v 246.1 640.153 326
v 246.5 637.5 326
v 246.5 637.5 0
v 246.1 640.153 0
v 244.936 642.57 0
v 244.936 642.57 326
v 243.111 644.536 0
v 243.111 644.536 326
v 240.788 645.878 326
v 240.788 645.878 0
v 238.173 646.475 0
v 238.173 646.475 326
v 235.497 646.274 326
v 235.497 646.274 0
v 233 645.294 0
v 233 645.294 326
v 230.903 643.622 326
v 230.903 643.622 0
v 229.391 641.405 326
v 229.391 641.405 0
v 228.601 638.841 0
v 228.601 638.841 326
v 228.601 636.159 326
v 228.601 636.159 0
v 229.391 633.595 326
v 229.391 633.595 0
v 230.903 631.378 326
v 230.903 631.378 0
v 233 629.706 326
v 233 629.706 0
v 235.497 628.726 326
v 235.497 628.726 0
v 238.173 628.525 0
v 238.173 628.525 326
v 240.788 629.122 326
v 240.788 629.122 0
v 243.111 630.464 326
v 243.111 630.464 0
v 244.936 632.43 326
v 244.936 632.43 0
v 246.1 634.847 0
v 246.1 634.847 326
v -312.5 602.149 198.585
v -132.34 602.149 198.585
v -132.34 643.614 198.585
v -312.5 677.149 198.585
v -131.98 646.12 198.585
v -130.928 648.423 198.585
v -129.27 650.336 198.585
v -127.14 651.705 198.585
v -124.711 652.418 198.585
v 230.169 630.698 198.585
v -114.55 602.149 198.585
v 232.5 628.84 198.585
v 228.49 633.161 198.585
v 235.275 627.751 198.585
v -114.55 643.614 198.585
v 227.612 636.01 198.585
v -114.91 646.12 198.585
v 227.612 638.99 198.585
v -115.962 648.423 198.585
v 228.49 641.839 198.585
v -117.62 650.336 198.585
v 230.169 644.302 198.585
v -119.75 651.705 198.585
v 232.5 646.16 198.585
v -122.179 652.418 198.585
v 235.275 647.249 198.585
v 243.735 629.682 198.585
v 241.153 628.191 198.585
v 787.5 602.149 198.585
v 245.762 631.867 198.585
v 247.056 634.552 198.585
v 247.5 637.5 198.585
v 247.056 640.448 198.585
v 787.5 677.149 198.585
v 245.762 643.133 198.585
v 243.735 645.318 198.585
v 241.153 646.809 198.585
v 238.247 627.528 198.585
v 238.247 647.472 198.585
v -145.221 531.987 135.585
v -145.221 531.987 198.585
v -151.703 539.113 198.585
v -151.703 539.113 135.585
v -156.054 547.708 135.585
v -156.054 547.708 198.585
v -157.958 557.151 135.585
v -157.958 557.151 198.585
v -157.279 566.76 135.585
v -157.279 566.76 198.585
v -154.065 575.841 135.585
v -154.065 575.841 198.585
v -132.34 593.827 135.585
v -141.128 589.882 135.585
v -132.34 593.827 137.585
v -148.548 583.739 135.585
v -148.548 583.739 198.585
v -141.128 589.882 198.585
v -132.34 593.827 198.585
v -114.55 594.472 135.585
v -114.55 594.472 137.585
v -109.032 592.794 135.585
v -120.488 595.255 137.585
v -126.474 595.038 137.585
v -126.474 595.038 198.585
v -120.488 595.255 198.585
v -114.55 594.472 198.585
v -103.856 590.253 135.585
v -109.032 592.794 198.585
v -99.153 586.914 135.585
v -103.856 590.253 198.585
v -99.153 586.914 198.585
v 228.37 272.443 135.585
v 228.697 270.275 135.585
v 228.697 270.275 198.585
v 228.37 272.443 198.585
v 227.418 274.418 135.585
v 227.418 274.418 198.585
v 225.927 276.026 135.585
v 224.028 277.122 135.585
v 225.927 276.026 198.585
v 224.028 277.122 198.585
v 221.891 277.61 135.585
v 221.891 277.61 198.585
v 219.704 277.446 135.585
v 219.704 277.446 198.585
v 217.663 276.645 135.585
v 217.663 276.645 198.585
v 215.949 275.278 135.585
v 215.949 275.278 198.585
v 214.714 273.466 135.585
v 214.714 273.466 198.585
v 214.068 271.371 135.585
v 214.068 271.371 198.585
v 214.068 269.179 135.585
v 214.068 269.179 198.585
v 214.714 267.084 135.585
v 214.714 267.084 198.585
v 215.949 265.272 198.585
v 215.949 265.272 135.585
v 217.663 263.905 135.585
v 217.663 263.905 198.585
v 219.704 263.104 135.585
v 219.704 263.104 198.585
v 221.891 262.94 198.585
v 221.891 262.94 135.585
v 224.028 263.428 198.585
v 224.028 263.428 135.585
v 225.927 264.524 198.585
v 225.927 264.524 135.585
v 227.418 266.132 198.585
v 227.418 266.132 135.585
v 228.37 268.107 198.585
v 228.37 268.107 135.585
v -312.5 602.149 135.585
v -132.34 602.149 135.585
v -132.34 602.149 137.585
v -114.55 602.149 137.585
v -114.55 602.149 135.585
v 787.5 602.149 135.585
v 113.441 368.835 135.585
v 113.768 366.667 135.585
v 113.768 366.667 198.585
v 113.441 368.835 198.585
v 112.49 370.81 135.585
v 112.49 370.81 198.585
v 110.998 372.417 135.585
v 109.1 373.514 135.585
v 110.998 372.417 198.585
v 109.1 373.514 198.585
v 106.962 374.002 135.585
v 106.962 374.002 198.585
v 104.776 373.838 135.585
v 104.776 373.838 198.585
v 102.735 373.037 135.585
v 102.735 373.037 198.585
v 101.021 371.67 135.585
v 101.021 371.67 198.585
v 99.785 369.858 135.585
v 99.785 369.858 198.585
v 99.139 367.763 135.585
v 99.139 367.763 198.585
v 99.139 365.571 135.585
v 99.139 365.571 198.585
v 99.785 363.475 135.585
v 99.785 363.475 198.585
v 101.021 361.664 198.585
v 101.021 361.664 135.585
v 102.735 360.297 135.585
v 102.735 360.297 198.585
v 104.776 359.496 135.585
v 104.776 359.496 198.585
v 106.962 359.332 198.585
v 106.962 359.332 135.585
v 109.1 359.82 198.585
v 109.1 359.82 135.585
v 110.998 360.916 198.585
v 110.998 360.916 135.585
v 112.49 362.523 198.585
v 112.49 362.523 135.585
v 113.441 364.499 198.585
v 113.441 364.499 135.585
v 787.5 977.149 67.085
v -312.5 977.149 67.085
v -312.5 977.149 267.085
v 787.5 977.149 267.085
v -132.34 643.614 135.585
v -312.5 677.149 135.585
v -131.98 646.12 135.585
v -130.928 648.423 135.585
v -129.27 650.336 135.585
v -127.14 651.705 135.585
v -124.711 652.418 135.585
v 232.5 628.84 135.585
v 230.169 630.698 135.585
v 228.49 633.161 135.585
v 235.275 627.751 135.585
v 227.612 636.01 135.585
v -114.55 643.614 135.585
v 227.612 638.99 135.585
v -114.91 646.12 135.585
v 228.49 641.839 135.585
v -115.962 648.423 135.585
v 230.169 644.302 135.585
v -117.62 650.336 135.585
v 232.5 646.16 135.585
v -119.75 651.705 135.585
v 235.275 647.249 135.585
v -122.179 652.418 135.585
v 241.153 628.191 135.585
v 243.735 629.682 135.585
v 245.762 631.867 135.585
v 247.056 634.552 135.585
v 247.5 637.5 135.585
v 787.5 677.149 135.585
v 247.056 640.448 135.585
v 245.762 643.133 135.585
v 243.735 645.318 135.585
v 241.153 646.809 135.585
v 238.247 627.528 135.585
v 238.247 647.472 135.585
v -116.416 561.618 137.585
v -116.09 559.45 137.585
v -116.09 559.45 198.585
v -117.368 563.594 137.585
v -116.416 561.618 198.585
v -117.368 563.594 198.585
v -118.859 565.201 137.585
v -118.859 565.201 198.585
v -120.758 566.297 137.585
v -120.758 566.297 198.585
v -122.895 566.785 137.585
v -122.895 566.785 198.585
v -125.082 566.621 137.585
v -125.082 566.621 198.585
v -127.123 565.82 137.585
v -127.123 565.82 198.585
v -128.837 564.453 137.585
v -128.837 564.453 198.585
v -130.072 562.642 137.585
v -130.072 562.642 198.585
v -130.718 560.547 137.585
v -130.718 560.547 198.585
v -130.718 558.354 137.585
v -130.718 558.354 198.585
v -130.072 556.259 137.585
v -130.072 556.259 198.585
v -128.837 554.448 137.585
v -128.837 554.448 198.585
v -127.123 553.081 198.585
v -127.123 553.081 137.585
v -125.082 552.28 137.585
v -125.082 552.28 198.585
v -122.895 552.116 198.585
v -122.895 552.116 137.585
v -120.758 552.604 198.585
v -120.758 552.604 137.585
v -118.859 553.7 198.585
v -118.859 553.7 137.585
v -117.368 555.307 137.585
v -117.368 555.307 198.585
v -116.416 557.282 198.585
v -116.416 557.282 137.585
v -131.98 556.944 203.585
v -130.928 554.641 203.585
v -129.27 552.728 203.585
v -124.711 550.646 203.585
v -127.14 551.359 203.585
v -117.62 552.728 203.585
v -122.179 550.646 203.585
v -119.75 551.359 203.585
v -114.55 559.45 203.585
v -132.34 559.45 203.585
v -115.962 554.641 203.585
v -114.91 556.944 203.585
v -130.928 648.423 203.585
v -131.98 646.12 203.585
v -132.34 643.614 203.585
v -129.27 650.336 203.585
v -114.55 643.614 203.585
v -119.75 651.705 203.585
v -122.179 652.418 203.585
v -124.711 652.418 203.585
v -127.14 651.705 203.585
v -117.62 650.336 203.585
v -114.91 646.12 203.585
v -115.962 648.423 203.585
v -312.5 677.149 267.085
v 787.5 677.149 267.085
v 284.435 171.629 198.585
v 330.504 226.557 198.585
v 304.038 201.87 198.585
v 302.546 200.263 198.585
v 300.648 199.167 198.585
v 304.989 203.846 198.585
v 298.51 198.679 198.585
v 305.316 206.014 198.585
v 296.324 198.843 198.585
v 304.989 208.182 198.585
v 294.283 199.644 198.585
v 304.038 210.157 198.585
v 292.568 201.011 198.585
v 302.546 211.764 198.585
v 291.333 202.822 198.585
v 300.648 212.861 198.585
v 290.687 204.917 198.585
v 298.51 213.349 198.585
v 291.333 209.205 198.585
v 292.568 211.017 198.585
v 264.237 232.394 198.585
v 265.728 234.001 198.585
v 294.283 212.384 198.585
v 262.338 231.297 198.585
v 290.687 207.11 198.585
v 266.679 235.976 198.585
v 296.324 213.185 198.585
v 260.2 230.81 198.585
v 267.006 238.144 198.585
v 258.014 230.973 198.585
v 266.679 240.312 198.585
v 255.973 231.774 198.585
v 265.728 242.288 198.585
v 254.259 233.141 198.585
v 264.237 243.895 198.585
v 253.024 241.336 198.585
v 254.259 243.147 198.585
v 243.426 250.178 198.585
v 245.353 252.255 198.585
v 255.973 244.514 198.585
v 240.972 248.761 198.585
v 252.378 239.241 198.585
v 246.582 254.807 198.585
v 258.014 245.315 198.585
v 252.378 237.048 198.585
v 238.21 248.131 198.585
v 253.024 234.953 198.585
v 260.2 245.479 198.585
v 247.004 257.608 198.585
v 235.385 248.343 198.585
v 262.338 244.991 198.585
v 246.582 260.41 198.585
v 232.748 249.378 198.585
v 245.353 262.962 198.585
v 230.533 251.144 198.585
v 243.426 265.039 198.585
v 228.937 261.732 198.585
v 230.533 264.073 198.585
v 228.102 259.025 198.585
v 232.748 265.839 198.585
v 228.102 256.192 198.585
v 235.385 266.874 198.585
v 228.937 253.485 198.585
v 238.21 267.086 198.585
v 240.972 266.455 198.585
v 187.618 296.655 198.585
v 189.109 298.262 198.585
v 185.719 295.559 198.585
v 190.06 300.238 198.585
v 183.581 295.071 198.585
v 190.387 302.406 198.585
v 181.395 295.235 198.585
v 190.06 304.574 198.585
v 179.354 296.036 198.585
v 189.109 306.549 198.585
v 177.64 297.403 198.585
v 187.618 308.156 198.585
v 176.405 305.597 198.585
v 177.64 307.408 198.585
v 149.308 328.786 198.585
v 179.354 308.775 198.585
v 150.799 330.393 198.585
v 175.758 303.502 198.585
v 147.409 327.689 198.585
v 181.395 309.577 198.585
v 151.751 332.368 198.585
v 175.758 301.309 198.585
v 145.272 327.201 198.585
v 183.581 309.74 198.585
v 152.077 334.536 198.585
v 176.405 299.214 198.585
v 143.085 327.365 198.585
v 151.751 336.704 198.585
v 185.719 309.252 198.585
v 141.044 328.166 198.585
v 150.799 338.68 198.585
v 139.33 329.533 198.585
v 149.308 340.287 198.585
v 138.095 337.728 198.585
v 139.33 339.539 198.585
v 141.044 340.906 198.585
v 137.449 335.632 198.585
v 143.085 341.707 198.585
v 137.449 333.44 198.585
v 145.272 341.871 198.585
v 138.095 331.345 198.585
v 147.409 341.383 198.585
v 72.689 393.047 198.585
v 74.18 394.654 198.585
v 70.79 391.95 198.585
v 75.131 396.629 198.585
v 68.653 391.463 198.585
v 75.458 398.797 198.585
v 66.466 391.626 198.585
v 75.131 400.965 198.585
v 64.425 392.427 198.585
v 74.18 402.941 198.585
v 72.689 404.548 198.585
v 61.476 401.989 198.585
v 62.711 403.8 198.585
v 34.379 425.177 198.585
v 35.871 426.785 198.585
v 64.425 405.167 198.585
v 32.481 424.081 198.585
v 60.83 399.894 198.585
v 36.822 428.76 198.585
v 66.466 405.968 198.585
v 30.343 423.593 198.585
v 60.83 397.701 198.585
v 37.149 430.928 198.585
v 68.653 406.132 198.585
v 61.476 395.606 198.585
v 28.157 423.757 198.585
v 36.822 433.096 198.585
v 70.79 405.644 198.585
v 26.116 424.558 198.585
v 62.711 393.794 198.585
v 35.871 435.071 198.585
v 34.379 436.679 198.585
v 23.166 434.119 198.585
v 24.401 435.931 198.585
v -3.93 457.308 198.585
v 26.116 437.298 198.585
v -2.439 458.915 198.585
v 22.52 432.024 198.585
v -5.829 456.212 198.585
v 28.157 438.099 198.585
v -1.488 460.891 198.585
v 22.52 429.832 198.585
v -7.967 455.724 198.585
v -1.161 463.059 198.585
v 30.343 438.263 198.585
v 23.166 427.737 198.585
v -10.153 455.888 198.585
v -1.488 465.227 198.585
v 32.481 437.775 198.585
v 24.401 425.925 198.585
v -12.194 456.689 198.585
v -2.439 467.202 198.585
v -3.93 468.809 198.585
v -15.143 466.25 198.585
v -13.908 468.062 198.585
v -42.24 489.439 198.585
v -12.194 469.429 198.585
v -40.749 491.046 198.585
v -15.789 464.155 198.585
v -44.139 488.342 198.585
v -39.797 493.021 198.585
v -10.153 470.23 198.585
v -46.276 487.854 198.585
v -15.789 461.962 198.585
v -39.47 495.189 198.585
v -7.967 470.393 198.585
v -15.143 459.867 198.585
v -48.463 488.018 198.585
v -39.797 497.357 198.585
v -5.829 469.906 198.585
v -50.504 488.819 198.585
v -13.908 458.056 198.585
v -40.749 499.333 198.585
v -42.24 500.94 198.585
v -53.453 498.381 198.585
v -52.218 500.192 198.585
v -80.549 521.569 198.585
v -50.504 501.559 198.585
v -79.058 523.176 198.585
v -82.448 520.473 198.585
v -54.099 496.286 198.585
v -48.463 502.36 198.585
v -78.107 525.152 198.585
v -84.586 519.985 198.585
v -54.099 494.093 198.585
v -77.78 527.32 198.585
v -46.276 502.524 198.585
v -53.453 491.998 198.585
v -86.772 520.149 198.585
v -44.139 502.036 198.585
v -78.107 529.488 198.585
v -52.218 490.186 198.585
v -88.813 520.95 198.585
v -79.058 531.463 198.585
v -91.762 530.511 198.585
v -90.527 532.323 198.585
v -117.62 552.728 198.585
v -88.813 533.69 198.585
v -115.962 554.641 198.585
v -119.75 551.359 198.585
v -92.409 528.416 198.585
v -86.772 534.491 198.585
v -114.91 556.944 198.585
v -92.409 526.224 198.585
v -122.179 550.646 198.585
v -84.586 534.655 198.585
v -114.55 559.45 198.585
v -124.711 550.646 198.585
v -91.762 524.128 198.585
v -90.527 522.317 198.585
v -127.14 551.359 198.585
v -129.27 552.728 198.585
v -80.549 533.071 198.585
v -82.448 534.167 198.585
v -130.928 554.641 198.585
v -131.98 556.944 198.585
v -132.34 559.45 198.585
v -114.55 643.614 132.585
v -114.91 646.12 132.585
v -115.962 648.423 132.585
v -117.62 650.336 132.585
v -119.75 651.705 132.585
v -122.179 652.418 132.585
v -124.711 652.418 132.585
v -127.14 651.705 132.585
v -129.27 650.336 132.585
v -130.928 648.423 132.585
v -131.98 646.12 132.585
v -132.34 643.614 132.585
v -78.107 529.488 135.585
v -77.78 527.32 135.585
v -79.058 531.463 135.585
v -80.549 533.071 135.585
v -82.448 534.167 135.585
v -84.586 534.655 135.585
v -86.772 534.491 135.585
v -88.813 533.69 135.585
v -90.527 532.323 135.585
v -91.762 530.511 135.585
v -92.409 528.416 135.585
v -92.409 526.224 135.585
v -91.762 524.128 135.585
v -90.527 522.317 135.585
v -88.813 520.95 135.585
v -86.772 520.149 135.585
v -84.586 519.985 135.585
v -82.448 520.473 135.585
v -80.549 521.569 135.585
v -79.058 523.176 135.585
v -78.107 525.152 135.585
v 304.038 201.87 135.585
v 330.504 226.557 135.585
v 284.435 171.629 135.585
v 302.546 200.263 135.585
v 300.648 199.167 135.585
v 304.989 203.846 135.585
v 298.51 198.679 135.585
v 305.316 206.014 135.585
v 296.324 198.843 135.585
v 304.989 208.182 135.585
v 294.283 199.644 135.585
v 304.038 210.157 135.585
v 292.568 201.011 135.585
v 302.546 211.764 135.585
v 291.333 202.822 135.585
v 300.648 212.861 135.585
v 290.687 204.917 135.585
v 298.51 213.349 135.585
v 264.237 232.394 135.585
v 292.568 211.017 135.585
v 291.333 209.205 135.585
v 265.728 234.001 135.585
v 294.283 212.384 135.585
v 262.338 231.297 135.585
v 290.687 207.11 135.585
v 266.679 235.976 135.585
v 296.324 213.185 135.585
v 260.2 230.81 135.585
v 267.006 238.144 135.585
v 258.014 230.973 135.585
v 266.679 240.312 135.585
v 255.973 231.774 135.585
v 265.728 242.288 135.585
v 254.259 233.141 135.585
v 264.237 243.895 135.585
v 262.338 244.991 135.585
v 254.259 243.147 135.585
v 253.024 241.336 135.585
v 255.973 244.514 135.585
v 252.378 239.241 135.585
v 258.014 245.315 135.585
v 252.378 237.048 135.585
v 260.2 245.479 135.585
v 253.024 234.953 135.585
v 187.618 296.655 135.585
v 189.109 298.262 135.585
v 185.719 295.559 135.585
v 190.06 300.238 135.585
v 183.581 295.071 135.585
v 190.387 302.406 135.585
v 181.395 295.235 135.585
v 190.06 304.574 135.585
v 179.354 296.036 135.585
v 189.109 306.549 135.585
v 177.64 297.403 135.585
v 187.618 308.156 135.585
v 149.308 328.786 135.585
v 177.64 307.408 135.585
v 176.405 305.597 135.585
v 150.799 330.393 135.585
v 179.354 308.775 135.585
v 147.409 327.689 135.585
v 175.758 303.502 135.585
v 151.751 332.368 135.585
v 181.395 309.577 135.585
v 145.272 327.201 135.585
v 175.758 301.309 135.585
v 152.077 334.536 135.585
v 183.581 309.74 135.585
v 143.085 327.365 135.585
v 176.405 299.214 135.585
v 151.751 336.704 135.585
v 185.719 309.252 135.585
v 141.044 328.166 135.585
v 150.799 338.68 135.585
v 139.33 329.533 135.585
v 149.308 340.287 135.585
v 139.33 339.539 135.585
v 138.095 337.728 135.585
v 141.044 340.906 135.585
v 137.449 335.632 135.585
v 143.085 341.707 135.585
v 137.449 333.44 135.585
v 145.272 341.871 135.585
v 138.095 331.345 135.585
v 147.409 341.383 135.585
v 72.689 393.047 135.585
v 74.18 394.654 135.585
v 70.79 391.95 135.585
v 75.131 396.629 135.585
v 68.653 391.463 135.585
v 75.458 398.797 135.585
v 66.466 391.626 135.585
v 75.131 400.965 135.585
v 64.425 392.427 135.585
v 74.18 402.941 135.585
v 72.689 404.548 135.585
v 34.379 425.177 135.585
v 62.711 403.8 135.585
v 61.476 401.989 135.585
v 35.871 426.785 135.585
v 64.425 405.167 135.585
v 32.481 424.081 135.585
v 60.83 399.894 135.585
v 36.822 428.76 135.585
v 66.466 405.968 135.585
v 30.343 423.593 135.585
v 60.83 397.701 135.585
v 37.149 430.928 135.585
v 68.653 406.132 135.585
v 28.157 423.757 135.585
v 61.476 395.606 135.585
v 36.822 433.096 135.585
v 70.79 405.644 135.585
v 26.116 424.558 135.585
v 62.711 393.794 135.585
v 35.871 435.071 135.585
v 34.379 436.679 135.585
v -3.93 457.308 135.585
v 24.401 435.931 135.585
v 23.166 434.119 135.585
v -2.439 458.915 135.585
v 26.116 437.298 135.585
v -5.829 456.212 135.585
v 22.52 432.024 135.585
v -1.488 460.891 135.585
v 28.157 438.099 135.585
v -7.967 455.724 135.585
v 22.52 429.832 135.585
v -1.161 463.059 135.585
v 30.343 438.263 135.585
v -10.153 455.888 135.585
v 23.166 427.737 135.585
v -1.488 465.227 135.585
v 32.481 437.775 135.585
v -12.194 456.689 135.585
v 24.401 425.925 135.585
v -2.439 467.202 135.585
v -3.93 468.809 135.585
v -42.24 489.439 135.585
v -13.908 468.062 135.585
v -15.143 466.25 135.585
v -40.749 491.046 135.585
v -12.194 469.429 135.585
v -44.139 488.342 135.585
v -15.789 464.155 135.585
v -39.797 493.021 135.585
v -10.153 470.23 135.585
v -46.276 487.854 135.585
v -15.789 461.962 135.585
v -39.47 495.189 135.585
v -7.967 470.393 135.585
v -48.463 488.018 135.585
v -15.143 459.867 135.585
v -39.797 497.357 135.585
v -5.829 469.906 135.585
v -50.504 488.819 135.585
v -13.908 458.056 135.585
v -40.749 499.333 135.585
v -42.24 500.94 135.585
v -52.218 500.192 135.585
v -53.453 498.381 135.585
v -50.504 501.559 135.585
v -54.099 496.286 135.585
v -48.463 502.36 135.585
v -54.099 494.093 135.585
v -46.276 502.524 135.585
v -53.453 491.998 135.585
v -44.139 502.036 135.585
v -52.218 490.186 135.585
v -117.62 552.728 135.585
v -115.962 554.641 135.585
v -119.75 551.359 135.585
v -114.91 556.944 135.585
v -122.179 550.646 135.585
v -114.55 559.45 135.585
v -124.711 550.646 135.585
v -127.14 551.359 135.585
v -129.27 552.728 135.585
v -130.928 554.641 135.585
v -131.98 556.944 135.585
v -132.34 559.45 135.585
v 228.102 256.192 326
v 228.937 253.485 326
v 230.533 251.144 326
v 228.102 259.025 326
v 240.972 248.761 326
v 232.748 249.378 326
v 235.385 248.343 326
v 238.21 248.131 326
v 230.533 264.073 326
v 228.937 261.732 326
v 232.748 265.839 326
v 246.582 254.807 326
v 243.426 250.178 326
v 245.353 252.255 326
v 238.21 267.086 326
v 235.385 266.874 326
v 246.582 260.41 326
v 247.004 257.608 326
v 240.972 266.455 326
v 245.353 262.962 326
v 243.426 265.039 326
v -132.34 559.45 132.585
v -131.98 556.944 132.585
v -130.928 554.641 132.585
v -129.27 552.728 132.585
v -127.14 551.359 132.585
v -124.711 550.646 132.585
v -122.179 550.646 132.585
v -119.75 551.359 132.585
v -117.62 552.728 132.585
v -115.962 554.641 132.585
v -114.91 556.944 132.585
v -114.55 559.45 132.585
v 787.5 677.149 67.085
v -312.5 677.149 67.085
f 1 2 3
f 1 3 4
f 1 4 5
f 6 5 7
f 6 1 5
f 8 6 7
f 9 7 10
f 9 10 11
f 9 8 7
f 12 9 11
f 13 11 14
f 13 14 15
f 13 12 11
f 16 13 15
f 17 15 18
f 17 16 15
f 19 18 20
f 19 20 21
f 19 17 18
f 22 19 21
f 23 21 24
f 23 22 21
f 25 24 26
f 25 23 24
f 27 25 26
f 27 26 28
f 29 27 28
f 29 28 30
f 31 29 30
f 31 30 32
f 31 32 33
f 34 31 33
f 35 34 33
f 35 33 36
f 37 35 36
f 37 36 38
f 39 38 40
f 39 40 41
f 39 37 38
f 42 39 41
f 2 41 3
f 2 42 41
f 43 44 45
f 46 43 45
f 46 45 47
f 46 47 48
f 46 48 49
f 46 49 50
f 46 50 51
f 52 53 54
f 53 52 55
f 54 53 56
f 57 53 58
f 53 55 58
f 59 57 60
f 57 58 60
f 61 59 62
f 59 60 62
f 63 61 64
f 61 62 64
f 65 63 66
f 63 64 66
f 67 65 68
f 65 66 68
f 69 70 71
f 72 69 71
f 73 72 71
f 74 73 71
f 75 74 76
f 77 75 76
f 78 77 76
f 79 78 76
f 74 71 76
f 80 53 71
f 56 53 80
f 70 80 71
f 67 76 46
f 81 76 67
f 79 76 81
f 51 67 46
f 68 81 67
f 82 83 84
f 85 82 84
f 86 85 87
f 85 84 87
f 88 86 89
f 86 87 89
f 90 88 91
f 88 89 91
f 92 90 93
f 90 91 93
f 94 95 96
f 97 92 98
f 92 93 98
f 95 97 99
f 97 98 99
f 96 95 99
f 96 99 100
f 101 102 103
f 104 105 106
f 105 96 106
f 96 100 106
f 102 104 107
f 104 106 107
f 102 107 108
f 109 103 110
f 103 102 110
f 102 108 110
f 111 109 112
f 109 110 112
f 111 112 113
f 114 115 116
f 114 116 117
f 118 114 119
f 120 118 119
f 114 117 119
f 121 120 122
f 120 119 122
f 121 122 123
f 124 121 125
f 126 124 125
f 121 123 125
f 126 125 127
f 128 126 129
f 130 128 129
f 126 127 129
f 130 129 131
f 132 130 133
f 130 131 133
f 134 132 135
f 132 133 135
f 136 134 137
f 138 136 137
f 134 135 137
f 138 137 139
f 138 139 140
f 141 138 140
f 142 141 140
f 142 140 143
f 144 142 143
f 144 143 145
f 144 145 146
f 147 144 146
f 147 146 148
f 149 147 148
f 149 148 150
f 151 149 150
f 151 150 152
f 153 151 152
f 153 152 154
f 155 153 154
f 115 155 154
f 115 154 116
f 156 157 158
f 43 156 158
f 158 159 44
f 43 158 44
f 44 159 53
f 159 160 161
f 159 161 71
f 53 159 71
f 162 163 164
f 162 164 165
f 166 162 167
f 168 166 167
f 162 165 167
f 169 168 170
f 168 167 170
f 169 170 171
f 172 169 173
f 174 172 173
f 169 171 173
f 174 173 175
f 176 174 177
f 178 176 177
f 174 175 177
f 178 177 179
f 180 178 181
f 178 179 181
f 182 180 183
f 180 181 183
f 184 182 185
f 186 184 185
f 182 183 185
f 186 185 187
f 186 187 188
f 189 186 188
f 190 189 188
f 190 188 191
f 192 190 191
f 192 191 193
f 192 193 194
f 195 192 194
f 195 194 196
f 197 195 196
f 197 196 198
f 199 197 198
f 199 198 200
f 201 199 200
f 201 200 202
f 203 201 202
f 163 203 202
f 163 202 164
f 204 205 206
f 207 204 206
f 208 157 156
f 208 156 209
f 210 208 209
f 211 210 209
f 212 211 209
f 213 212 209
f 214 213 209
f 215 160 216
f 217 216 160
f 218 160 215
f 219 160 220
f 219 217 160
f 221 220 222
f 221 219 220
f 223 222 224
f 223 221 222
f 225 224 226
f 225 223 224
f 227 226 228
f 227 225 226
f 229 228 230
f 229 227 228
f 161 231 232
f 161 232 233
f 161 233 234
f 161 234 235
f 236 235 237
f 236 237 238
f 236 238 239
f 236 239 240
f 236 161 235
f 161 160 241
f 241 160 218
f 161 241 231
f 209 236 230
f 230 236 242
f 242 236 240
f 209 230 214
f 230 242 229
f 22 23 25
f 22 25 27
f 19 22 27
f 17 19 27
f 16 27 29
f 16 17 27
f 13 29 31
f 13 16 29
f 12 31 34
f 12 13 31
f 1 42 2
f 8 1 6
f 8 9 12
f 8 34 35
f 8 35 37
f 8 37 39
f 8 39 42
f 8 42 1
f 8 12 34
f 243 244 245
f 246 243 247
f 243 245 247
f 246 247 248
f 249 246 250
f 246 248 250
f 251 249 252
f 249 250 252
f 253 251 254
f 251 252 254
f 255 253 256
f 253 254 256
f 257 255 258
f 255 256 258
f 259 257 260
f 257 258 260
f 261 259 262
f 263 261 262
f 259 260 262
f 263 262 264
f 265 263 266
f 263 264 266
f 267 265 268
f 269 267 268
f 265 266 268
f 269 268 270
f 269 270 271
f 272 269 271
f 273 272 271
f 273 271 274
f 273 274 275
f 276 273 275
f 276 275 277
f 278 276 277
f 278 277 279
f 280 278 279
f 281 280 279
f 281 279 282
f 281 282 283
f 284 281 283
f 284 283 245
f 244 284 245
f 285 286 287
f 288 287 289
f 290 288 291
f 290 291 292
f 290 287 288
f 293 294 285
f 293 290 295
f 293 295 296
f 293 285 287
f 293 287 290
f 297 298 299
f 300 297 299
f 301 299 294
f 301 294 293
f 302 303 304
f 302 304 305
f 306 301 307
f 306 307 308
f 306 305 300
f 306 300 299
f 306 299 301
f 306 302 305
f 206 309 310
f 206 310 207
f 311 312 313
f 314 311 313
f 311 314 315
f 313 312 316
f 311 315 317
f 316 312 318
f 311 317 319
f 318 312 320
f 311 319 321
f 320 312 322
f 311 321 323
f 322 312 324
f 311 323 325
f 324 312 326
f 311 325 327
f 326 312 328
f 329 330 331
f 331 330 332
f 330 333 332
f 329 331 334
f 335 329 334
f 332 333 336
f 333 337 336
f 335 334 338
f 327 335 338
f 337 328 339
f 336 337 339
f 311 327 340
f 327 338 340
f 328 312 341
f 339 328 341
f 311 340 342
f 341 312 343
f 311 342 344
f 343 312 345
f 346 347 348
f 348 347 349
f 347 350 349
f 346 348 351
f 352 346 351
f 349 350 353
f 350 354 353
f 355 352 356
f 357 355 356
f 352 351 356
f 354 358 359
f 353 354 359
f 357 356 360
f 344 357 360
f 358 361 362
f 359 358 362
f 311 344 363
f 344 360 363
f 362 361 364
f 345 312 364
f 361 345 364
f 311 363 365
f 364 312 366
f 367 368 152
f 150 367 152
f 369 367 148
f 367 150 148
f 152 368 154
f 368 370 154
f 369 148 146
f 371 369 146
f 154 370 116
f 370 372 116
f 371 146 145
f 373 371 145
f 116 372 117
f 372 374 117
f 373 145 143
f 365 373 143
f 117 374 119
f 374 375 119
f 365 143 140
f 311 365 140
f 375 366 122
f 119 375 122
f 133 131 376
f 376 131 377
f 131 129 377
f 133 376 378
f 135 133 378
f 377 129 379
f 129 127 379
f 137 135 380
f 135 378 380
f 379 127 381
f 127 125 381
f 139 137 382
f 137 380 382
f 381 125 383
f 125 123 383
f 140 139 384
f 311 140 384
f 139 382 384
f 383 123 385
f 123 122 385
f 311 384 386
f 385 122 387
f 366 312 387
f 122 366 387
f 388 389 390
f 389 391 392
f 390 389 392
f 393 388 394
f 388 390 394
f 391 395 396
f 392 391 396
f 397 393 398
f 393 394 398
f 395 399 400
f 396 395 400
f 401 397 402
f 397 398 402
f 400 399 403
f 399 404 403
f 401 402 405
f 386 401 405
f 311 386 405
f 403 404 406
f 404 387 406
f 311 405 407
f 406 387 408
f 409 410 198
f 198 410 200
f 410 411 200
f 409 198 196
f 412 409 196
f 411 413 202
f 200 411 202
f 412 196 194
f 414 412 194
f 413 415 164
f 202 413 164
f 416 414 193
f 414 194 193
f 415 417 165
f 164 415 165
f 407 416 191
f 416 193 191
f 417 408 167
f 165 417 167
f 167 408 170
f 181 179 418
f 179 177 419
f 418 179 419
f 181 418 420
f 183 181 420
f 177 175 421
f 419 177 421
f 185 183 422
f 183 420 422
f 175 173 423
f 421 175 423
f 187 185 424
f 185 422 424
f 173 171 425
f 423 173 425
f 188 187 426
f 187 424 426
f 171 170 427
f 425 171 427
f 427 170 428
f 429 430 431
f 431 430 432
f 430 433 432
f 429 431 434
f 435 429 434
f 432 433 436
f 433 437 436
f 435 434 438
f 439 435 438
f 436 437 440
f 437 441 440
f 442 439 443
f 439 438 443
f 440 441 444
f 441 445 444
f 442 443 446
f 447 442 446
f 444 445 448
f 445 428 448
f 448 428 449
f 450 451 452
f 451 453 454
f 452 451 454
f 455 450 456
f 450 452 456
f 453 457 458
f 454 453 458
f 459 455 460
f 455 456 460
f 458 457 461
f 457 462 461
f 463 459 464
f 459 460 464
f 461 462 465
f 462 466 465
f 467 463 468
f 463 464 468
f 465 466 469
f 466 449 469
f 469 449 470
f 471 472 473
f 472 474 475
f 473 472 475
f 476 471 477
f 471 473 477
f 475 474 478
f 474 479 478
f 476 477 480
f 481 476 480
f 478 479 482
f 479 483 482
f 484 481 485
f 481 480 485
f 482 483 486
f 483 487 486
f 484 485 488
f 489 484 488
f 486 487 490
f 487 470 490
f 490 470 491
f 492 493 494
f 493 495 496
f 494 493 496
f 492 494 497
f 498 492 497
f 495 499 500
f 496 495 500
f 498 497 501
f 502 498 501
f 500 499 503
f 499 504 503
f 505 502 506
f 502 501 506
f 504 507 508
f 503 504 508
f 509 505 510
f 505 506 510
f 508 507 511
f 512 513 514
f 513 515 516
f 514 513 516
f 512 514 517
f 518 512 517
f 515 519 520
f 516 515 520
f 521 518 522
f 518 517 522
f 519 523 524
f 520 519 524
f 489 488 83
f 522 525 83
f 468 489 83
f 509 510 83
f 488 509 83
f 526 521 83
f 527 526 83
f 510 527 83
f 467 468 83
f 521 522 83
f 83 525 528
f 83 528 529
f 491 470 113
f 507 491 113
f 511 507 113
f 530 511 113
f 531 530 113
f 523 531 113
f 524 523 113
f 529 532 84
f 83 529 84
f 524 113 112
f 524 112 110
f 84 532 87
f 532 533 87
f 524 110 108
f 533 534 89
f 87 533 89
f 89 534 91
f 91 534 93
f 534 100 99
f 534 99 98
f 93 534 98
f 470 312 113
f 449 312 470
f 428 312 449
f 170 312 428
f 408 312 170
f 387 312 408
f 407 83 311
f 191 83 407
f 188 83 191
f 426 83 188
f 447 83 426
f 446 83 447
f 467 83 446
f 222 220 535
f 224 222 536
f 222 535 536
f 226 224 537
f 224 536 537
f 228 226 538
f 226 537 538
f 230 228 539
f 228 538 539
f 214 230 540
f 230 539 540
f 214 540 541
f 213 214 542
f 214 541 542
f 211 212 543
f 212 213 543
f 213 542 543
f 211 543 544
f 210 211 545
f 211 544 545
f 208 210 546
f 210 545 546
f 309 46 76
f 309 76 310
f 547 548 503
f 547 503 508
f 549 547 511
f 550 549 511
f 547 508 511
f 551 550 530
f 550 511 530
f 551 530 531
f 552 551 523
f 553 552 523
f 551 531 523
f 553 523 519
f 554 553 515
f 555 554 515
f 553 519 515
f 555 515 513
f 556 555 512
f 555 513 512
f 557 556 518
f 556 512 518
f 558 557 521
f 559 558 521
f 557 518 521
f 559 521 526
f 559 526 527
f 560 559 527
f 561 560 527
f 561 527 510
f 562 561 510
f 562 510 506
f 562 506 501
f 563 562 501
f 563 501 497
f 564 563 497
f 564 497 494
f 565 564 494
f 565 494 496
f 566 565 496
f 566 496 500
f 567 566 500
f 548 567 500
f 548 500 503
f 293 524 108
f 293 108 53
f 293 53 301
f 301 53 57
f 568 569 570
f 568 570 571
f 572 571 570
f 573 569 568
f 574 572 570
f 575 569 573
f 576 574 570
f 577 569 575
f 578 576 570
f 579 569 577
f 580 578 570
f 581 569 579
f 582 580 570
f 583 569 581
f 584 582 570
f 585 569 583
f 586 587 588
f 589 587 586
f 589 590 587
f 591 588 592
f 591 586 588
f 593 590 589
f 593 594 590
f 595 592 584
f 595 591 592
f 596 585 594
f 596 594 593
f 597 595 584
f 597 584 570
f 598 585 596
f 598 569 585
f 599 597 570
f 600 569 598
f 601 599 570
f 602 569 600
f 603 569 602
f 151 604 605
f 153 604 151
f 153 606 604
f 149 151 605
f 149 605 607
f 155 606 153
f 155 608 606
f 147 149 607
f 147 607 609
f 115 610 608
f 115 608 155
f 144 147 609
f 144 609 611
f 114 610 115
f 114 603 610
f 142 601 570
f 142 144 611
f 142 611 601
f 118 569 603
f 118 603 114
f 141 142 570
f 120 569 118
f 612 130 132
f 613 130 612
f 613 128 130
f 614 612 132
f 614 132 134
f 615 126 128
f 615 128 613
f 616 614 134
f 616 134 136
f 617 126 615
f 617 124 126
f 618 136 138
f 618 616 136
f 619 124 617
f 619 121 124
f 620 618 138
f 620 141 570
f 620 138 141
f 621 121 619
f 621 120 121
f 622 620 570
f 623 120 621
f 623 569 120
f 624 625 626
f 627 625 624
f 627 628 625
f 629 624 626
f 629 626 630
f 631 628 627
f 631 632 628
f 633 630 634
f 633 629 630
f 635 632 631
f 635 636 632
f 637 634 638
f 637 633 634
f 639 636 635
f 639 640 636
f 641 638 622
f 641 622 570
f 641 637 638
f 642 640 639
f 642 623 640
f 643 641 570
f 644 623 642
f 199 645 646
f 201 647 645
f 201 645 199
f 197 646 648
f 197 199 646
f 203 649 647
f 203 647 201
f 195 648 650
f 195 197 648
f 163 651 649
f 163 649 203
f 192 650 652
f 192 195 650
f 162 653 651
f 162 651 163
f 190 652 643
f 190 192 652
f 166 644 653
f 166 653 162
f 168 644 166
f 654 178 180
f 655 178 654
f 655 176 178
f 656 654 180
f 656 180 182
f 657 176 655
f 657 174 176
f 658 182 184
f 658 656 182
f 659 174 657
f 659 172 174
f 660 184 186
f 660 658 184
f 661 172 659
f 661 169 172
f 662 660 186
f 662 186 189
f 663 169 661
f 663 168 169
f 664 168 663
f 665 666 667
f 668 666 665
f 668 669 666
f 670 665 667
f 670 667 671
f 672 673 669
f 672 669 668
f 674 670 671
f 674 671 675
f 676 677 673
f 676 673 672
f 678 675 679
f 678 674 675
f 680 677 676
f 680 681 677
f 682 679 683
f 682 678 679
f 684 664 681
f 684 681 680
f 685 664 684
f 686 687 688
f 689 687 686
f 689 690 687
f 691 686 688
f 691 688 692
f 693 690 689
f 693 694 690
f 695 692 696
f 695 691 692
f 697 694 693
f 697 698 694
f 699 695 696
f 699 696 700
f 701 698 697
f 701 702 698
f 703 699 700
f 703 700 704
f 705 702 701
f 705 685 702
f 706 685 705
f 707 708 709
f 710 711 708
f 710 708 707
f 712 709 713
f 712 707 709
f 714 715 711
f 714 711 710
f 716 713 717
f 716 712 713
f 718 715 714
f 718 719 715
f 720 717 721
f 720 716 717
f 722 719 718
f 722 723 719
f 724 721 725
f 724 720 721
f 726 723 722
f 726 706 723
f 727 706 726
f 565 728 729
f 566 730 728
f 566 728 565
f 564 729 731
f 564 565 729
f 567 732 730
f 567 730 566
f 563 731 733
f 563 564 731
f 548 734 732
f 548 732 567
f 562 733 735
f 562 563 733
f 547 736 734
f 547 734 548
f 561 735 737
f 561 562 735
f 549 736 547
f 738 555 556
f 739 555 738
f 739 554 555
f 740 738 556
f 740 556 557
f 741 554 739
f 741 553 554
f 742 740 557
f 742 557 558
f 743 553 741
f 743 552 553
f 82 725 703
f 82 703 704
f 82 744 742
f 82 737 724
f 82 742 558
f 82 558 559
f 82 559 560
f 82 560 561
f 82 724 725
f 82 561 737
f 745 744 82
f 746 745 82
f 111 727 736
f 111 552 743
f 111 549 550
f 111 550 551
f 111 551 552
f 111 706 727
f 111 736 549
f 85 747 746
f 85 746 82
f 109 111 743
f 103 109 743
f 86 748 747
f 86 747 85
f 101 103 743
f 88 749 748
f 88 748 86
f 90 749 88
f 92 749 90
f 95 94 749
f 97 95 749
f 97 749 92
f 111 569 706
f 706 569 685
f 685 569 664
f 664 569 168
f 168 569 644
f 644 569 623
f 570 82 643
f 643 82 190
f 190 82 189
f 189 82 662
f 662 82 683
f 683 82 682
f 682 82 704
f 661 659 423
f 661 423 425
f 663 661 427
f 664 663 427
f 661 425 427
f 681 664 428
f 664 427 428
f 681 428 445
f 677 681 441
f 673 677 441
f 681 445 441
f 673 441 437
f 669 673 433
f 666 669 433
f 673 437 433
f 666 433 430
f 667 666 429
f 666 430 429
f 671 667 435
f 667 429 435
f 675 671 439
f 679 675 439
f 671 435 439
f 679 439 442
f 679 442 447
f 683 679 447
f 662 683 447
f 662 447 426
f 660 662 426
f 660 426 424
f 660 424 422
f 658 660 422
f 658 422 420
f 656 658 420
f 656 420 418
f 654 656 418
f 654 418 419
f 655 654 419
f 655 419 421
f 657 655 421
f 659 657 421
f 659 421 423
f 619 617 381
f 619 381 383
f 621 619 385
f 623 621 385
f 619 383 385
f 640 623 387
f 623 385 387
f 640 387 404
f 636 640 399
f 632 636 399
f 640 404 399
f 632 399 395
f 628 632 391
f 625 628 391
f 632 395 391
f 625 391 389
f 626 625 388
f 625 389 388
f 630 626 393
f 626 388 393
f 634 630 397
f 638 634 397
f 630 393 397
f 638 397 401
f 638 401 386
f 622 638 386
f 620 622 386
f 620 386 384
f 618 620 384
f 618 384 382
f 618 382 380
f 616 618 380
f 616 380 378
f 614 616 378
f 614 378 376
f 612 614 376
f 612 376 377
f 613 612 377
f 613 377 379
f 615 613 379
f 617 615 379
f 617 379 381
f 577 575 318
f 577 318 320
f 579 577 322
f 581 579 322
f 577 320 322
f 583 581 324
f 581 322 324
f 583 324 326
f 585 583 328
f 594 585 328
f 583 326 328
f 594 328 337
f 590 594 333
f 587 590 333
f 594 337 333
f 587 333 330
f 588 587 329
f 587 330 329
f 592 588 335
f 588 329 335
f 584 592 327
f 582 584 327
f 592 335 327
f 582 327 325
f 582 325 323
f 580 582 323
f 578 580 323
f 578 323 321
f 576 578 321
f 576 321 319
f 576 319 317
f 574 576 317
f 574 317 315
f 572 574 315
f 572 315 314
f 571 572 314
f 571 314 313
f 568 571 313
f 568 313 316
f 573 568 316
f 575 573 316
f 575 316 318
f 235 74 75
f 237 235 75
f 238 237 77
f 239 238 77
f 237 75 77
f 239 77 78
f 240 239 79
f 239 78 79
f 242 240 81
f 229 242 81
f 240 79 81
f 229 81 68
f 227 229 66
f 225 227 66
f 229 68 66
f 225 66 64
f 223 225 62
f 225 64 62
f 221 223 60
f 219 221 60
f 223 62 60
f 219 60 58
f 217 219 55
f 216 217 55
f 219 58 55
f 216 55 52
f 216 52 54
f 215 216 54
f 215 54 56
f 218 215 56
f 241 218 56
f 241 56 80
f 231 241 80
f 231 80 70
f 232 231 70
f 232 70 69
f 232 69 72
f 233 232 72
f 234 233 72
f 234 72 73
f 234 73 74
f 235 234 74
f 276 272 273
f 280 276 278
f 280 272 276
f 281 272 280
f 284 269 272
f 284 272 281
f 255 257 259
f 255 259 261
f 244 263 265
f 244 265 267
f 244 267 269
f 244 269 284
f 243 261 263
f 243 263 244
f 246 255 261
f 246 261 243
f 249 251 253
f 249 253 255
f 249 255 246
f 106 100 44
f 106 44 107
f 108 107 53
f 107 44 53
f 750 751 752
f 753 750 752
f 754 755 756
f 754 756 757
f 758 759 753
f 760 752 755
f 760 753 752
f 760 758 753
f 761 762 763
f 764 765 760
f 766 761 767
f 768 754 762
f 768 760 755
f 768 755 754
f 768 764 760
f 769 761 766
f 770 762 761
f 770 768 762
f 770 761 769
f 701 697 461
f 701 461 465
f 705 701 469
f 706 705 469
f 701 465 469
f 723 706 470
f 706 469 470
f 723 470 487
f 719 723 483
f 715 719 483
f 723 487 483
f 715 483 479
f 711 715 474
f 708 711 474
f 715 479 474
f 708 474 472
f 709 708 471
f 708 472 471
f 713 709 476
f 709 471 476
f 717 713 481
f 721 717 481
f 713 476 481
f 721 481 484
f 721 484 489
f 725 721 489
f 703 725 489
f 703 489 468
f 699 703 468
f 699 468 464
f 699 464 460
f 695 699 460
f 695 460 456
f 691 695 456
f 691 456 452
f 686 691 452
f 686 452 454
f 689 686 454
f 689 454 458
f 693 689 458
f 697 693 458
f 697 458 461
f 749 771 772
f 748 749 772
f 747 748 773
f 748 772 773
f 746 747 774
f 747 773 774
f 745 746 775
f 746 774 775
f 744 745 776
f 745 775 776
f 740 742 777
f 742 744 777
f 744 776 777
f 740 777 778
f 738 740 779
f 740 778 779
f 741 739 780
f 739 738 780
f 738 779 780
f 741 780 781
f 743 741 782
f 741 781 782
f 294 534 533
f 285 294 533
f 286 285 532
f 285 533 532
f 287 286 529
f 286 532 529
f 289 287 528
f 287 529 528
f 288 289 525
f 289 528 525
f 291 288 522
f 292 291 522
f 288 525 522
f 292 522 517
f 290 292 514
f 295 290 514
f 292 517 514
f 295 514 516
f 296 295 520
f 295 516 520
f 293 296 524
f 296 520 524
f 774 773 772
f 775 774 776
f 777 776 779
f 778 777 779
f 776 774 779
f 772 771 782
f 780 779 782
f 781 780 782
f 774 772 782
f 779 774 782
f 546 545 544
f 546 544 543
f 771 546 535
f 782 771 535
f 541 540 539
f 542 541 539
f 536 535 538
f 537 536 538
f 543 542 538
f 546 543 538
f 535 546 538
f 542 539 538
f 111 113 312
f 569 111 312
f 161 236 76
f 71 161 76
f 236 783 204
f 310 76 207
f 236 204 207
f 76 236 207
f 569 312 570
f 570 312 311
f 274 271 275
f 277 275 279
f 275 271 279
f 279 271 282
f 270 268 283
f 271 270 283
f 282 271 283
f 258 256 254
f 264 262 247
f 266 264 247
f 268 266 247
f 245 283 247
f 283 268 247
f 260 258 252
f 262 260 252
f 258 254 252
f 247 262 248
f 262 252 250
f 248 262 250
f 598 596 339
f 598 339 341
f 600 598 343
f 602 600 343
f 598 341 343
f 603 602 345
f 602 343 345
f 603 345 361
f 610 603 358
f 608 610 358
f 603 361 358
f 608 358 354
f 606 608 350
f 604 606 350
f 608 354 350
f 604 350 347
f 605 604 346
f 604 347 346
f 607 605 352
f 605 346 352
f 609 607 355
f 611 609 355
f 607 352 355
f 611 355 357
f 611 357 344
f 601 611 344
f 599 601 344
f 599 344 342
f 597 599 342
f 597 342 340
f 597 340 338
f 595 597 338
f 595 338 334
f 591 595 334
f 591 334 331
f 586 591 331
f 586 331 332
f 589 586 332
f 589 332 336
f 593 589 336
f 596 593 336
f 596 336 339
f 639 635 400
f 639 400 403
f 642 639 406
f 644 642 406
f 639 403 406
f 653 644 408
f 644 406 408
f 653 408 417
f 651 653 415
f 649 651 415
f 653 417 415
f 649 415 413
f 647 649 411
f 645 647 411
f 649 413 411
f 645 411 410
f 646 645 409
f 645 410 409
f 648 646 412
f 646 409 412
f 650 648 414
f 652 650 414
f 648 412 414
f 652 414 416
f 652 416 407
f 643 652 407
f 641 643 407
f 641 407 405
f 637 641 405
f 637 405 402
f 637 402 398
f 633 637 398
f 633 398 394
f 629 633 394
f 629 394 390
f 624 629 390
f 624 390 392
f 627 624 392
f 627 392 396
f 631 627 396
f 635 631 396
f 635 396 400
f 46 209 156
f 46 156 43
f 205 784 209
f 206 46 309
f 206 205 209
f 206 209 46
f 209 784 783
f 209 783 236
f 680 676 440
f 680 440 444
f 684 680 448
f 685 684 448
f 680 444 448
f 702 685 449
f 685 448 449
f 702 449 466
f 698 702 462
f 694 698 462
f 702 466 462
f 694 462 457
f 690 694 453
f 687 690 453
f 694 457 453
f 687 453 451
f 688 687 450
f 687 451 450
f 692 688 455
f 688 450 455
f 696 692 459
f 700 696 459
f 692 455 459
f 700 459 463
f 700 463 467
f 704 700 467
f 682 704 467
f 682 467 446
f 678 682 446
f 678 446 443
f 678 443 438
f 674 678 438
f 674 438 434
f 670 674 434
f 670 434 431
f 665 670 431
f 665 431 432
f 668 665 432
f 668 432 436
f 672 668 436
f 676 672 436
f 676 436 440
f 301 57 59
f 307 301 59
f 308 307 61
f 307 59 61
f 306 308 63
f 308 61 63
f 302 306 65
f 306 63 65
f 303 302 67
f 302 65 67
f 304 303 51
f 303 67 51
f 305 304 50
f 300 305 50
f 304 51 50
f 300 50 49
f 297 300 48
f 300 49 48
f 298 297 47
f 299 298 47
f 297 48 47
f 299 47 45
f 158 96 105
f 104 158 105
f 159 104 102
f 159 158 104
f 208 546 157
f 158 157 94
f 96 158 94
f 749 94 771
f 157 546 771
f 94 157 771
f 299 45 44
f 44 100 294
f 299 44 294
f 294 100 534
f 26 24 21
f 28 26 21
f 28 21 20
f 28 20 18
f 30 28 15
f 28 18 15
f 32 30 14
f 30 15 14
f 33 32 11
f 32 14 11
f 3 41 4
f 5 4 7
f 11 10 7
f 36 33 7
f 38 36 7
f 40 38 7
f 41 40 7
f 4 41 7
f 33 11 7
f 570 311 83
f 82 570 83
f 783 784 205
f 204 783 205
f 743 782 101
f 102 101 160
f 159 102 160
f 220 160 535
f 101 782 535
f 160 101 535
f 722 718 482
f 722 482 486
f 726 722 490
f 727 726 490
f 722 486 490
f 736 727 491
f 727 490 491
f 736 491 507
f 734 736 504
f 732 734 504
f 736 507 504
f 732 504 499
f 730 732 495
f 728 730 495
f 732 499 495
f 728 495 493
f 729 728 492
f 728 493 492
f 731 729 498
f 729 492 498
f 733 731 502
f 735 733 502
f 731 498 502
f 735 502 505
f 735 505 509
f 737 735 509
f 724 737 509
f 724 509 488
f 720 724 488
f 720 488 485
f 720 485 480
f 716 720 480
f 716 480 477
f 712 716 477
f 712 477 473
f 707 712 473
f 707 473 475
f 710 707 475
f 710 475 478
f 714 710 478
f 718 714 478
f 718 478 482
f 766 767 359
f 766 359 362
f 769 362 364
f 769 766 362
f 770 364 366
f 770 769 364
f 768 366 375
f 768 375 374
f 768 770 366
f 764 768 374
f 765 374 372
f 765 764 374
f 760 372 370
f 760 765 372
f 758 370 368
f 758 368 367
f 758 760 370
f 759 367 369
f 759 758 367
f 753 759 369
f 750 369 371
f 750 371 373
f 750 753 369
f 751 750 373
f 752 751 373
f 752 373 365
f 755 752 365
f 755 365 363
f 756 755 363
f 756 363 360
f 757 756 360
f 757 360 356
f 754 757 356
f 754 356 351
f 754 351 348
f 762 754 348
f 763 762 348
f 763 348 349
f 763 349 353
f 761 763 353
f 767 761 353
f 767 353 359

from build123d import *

# Parameters (mm, degrees)
BOSS_EXTRU_4_DEPTH         = 550
BOSS_EXTRU_4_DEPTH_BACK    = 550
ESQUISSE7_W                = 63
ESQUISSE7_H                = 75
ESQUISSE3_R                = 10
ENL_V_MAT_EXTRU_2_DEPTH    = 1056.909601573
BOSS_EXTRU_5_DEPTH         = 63
BOSS_EXTRU_6_DEPTH         = 5
ESQUISSE12_R               = 7.355365699
ENL_V_MAT_EXTRU_3_DEPTH    = 100
R_P_TITION_LIN_AIRE2_COUNT = 12
R_P_TITION_LIN_AIRE2_PITCH = 50
BOSS_EXTRU_7_REACH         = 1057.91
ESQUISSE13_R               = 9.503964929
R_P_TITION_LIN_AIRE3_COUNT = 2
R_P_TITION_LIN_AIRE3_PITCH = 66
ESQUISSE14_R               = 9
BOSS_EXTRU_8_DEPTH         = 326
ESQUISSE15_W               = 200
ESQUISSE15_H               = 300
BOSS_EXTRU_9_DEPTH         = 1100


with BuildPart() as part:
    # Esquisse7 → Boss.-Extru.4 (new, two sides: drawn at the far end of the back side and taken through both)
    with BuildSketch(Plane.ZY.offset(-237.5).offset(-BOSS_EXTRU_4_DEPTH_BACK)):
        with Locations((167.0850662, 639.649163537)):
            Rectangle(ESQUISSE7_W, ESQUISSE7_H)
    extrude(amount=BOSS_EXTRU_4_DEPTH + BOSS_EXTRU_4_DEPTH_BACK)

    # Esquisse3 → Enlèv. mat.-Extru.2 (cut, through all)
    with BuildSketch(Plane.XY.offset(326)):
        with Locations((237.5, 637.5)):
            Circle(ESQUISSE3_R)
    extrude(amount=-ENL_V_MAT_EXTRU_2_DEPTH, mode=Mode.SUBTRACT)



with BuildPart() as body_2:
    # Esquisse11 → Boss.-Extru.5 (new body)
    with BuildSketch(Plane.XY.offset(198.5850662)):
        with BuildLine():
            Line((330.503621206, 226.557033524), (-99.153084709, 586.914270743))
            ThreePointArc((-99.153084709, 586.914270743), (-149.651047416, 582.484624891), (-145.221401564, 531.986662185))
            Line((-145.221401564, 531.986662185), (284.435304351, 171.629424966))
            Line((284.435304351, 171.629424966), (330.503621206, 226.557033524))
        make_face()
    extrude(amount=-BOSS_EXTRU_5_DEPTH)


with BuildPart() as part_1:
    add(part.part)

    add(body_2.part)  # Boss.-Extru.6 merges body 2
    # Esquisse11<3> → Boss.-Extru.6 (add)
    with BuildSketch(Plane.XY.offset(198.5850662)):
        with BuildLine():
            ThreePointArc((-114.54998443, 643.613737641), (-123.445013511, 652.508766722), (-132.340042592, 643.613737641))
            Line((-132.340042592, 643.613737641), (-132.340042592, 559.450466464))
            ThreePointArc((-132.340042592, 559.450466464), (-123.445013511, 550.555437383), (-114.54998443, 559.450466464))
            Line((-114.54998443, 559.450466464), (-114.54998443, 643.613737641))
        make_face()
    boss_extru_6 = extrude(amount=BOSS_EXTRU_6_DEPTH)

    # Esquisse12 → Enlèv. mat.-Extru.3 (cut)
    with BuildSketch(Plane.XY.offset(198.5850662)):
        with Locations((-123.445013511, 559.450466464)):
            Circle(ESQUISSE12_R)
    enl_v_mat_extru_3 = extrude(amount=-ENL_V_MAT_EXTRU_3_DEPTH, mode=Mode.SUBTRACT)

    # Répétition linéaire2: Enlèv. mat.-Extru.3 ×12
    with Locations(*[Vector(0.7661915431257937, -0.6426122619764698, 0) * (i * R_P_TITION_LIN_AIRE2_PITCH) for i in range(1, R_P_TITION_LIN_AIRE2_COUNT)]):
        add(enl_v_mat_extru_3, mode=Mode.SUBTRACT)

    # Esquisse13 → Boss.-Extru.7 (add, up to next)
    with BuildSketch(Plane.XY.offset(326), mode=Mode.PRIVATE) as boss_extru_7_sk1:
        with Locations((237.5, 257.608372702)):
            Circle(ESQUISSE13_R)
    boss_extru_7_tool1 = extrude(boss_extru_7_sk1.sketch, amount=-BOSS_EXTRU_7_REACH, mode=Mode.PRIVATE) - part_1.part
    add(boss_extru_7_tool1.solids().sort_by_distance((237.5, 257.608373, 326))[0])

    # Répétition linéaire3: Boss.-Extru.6 ×2
    with Locations(*[(0, 0, -i * R_P_TITION_LIN_AIRE3_PITCH) for i in range(1, R_P_TITION_LIN_AIRE3_COUNT)]):
        add(boss_extru_6)

    # Esquisse15 → Boss.-Extru.9 (add)
    with BuildSketch(Plane.ZY.offset(312.5)):
        with Locations((167.0850662, 827.149163537)):
            Rectangle(ESQUISSE15_W, ESQUISSE15_H)
    extrude(amount=-BOSS_EXTRU_9_DEPTH)


with BuildPart() as body_2_2:
    # Esquisse14 → Boss.-Extru.8 (new body)
    with BuildSketch(Plane.XY.offset(326)):
        with Locations((237.5, 637.5)):
            Circle(ESQUISSE14_R)
    extrude(amount=-BOSS_EXTRU_8_DEPTH)


solid = Compound([part_1.part, body_2_2.part])
